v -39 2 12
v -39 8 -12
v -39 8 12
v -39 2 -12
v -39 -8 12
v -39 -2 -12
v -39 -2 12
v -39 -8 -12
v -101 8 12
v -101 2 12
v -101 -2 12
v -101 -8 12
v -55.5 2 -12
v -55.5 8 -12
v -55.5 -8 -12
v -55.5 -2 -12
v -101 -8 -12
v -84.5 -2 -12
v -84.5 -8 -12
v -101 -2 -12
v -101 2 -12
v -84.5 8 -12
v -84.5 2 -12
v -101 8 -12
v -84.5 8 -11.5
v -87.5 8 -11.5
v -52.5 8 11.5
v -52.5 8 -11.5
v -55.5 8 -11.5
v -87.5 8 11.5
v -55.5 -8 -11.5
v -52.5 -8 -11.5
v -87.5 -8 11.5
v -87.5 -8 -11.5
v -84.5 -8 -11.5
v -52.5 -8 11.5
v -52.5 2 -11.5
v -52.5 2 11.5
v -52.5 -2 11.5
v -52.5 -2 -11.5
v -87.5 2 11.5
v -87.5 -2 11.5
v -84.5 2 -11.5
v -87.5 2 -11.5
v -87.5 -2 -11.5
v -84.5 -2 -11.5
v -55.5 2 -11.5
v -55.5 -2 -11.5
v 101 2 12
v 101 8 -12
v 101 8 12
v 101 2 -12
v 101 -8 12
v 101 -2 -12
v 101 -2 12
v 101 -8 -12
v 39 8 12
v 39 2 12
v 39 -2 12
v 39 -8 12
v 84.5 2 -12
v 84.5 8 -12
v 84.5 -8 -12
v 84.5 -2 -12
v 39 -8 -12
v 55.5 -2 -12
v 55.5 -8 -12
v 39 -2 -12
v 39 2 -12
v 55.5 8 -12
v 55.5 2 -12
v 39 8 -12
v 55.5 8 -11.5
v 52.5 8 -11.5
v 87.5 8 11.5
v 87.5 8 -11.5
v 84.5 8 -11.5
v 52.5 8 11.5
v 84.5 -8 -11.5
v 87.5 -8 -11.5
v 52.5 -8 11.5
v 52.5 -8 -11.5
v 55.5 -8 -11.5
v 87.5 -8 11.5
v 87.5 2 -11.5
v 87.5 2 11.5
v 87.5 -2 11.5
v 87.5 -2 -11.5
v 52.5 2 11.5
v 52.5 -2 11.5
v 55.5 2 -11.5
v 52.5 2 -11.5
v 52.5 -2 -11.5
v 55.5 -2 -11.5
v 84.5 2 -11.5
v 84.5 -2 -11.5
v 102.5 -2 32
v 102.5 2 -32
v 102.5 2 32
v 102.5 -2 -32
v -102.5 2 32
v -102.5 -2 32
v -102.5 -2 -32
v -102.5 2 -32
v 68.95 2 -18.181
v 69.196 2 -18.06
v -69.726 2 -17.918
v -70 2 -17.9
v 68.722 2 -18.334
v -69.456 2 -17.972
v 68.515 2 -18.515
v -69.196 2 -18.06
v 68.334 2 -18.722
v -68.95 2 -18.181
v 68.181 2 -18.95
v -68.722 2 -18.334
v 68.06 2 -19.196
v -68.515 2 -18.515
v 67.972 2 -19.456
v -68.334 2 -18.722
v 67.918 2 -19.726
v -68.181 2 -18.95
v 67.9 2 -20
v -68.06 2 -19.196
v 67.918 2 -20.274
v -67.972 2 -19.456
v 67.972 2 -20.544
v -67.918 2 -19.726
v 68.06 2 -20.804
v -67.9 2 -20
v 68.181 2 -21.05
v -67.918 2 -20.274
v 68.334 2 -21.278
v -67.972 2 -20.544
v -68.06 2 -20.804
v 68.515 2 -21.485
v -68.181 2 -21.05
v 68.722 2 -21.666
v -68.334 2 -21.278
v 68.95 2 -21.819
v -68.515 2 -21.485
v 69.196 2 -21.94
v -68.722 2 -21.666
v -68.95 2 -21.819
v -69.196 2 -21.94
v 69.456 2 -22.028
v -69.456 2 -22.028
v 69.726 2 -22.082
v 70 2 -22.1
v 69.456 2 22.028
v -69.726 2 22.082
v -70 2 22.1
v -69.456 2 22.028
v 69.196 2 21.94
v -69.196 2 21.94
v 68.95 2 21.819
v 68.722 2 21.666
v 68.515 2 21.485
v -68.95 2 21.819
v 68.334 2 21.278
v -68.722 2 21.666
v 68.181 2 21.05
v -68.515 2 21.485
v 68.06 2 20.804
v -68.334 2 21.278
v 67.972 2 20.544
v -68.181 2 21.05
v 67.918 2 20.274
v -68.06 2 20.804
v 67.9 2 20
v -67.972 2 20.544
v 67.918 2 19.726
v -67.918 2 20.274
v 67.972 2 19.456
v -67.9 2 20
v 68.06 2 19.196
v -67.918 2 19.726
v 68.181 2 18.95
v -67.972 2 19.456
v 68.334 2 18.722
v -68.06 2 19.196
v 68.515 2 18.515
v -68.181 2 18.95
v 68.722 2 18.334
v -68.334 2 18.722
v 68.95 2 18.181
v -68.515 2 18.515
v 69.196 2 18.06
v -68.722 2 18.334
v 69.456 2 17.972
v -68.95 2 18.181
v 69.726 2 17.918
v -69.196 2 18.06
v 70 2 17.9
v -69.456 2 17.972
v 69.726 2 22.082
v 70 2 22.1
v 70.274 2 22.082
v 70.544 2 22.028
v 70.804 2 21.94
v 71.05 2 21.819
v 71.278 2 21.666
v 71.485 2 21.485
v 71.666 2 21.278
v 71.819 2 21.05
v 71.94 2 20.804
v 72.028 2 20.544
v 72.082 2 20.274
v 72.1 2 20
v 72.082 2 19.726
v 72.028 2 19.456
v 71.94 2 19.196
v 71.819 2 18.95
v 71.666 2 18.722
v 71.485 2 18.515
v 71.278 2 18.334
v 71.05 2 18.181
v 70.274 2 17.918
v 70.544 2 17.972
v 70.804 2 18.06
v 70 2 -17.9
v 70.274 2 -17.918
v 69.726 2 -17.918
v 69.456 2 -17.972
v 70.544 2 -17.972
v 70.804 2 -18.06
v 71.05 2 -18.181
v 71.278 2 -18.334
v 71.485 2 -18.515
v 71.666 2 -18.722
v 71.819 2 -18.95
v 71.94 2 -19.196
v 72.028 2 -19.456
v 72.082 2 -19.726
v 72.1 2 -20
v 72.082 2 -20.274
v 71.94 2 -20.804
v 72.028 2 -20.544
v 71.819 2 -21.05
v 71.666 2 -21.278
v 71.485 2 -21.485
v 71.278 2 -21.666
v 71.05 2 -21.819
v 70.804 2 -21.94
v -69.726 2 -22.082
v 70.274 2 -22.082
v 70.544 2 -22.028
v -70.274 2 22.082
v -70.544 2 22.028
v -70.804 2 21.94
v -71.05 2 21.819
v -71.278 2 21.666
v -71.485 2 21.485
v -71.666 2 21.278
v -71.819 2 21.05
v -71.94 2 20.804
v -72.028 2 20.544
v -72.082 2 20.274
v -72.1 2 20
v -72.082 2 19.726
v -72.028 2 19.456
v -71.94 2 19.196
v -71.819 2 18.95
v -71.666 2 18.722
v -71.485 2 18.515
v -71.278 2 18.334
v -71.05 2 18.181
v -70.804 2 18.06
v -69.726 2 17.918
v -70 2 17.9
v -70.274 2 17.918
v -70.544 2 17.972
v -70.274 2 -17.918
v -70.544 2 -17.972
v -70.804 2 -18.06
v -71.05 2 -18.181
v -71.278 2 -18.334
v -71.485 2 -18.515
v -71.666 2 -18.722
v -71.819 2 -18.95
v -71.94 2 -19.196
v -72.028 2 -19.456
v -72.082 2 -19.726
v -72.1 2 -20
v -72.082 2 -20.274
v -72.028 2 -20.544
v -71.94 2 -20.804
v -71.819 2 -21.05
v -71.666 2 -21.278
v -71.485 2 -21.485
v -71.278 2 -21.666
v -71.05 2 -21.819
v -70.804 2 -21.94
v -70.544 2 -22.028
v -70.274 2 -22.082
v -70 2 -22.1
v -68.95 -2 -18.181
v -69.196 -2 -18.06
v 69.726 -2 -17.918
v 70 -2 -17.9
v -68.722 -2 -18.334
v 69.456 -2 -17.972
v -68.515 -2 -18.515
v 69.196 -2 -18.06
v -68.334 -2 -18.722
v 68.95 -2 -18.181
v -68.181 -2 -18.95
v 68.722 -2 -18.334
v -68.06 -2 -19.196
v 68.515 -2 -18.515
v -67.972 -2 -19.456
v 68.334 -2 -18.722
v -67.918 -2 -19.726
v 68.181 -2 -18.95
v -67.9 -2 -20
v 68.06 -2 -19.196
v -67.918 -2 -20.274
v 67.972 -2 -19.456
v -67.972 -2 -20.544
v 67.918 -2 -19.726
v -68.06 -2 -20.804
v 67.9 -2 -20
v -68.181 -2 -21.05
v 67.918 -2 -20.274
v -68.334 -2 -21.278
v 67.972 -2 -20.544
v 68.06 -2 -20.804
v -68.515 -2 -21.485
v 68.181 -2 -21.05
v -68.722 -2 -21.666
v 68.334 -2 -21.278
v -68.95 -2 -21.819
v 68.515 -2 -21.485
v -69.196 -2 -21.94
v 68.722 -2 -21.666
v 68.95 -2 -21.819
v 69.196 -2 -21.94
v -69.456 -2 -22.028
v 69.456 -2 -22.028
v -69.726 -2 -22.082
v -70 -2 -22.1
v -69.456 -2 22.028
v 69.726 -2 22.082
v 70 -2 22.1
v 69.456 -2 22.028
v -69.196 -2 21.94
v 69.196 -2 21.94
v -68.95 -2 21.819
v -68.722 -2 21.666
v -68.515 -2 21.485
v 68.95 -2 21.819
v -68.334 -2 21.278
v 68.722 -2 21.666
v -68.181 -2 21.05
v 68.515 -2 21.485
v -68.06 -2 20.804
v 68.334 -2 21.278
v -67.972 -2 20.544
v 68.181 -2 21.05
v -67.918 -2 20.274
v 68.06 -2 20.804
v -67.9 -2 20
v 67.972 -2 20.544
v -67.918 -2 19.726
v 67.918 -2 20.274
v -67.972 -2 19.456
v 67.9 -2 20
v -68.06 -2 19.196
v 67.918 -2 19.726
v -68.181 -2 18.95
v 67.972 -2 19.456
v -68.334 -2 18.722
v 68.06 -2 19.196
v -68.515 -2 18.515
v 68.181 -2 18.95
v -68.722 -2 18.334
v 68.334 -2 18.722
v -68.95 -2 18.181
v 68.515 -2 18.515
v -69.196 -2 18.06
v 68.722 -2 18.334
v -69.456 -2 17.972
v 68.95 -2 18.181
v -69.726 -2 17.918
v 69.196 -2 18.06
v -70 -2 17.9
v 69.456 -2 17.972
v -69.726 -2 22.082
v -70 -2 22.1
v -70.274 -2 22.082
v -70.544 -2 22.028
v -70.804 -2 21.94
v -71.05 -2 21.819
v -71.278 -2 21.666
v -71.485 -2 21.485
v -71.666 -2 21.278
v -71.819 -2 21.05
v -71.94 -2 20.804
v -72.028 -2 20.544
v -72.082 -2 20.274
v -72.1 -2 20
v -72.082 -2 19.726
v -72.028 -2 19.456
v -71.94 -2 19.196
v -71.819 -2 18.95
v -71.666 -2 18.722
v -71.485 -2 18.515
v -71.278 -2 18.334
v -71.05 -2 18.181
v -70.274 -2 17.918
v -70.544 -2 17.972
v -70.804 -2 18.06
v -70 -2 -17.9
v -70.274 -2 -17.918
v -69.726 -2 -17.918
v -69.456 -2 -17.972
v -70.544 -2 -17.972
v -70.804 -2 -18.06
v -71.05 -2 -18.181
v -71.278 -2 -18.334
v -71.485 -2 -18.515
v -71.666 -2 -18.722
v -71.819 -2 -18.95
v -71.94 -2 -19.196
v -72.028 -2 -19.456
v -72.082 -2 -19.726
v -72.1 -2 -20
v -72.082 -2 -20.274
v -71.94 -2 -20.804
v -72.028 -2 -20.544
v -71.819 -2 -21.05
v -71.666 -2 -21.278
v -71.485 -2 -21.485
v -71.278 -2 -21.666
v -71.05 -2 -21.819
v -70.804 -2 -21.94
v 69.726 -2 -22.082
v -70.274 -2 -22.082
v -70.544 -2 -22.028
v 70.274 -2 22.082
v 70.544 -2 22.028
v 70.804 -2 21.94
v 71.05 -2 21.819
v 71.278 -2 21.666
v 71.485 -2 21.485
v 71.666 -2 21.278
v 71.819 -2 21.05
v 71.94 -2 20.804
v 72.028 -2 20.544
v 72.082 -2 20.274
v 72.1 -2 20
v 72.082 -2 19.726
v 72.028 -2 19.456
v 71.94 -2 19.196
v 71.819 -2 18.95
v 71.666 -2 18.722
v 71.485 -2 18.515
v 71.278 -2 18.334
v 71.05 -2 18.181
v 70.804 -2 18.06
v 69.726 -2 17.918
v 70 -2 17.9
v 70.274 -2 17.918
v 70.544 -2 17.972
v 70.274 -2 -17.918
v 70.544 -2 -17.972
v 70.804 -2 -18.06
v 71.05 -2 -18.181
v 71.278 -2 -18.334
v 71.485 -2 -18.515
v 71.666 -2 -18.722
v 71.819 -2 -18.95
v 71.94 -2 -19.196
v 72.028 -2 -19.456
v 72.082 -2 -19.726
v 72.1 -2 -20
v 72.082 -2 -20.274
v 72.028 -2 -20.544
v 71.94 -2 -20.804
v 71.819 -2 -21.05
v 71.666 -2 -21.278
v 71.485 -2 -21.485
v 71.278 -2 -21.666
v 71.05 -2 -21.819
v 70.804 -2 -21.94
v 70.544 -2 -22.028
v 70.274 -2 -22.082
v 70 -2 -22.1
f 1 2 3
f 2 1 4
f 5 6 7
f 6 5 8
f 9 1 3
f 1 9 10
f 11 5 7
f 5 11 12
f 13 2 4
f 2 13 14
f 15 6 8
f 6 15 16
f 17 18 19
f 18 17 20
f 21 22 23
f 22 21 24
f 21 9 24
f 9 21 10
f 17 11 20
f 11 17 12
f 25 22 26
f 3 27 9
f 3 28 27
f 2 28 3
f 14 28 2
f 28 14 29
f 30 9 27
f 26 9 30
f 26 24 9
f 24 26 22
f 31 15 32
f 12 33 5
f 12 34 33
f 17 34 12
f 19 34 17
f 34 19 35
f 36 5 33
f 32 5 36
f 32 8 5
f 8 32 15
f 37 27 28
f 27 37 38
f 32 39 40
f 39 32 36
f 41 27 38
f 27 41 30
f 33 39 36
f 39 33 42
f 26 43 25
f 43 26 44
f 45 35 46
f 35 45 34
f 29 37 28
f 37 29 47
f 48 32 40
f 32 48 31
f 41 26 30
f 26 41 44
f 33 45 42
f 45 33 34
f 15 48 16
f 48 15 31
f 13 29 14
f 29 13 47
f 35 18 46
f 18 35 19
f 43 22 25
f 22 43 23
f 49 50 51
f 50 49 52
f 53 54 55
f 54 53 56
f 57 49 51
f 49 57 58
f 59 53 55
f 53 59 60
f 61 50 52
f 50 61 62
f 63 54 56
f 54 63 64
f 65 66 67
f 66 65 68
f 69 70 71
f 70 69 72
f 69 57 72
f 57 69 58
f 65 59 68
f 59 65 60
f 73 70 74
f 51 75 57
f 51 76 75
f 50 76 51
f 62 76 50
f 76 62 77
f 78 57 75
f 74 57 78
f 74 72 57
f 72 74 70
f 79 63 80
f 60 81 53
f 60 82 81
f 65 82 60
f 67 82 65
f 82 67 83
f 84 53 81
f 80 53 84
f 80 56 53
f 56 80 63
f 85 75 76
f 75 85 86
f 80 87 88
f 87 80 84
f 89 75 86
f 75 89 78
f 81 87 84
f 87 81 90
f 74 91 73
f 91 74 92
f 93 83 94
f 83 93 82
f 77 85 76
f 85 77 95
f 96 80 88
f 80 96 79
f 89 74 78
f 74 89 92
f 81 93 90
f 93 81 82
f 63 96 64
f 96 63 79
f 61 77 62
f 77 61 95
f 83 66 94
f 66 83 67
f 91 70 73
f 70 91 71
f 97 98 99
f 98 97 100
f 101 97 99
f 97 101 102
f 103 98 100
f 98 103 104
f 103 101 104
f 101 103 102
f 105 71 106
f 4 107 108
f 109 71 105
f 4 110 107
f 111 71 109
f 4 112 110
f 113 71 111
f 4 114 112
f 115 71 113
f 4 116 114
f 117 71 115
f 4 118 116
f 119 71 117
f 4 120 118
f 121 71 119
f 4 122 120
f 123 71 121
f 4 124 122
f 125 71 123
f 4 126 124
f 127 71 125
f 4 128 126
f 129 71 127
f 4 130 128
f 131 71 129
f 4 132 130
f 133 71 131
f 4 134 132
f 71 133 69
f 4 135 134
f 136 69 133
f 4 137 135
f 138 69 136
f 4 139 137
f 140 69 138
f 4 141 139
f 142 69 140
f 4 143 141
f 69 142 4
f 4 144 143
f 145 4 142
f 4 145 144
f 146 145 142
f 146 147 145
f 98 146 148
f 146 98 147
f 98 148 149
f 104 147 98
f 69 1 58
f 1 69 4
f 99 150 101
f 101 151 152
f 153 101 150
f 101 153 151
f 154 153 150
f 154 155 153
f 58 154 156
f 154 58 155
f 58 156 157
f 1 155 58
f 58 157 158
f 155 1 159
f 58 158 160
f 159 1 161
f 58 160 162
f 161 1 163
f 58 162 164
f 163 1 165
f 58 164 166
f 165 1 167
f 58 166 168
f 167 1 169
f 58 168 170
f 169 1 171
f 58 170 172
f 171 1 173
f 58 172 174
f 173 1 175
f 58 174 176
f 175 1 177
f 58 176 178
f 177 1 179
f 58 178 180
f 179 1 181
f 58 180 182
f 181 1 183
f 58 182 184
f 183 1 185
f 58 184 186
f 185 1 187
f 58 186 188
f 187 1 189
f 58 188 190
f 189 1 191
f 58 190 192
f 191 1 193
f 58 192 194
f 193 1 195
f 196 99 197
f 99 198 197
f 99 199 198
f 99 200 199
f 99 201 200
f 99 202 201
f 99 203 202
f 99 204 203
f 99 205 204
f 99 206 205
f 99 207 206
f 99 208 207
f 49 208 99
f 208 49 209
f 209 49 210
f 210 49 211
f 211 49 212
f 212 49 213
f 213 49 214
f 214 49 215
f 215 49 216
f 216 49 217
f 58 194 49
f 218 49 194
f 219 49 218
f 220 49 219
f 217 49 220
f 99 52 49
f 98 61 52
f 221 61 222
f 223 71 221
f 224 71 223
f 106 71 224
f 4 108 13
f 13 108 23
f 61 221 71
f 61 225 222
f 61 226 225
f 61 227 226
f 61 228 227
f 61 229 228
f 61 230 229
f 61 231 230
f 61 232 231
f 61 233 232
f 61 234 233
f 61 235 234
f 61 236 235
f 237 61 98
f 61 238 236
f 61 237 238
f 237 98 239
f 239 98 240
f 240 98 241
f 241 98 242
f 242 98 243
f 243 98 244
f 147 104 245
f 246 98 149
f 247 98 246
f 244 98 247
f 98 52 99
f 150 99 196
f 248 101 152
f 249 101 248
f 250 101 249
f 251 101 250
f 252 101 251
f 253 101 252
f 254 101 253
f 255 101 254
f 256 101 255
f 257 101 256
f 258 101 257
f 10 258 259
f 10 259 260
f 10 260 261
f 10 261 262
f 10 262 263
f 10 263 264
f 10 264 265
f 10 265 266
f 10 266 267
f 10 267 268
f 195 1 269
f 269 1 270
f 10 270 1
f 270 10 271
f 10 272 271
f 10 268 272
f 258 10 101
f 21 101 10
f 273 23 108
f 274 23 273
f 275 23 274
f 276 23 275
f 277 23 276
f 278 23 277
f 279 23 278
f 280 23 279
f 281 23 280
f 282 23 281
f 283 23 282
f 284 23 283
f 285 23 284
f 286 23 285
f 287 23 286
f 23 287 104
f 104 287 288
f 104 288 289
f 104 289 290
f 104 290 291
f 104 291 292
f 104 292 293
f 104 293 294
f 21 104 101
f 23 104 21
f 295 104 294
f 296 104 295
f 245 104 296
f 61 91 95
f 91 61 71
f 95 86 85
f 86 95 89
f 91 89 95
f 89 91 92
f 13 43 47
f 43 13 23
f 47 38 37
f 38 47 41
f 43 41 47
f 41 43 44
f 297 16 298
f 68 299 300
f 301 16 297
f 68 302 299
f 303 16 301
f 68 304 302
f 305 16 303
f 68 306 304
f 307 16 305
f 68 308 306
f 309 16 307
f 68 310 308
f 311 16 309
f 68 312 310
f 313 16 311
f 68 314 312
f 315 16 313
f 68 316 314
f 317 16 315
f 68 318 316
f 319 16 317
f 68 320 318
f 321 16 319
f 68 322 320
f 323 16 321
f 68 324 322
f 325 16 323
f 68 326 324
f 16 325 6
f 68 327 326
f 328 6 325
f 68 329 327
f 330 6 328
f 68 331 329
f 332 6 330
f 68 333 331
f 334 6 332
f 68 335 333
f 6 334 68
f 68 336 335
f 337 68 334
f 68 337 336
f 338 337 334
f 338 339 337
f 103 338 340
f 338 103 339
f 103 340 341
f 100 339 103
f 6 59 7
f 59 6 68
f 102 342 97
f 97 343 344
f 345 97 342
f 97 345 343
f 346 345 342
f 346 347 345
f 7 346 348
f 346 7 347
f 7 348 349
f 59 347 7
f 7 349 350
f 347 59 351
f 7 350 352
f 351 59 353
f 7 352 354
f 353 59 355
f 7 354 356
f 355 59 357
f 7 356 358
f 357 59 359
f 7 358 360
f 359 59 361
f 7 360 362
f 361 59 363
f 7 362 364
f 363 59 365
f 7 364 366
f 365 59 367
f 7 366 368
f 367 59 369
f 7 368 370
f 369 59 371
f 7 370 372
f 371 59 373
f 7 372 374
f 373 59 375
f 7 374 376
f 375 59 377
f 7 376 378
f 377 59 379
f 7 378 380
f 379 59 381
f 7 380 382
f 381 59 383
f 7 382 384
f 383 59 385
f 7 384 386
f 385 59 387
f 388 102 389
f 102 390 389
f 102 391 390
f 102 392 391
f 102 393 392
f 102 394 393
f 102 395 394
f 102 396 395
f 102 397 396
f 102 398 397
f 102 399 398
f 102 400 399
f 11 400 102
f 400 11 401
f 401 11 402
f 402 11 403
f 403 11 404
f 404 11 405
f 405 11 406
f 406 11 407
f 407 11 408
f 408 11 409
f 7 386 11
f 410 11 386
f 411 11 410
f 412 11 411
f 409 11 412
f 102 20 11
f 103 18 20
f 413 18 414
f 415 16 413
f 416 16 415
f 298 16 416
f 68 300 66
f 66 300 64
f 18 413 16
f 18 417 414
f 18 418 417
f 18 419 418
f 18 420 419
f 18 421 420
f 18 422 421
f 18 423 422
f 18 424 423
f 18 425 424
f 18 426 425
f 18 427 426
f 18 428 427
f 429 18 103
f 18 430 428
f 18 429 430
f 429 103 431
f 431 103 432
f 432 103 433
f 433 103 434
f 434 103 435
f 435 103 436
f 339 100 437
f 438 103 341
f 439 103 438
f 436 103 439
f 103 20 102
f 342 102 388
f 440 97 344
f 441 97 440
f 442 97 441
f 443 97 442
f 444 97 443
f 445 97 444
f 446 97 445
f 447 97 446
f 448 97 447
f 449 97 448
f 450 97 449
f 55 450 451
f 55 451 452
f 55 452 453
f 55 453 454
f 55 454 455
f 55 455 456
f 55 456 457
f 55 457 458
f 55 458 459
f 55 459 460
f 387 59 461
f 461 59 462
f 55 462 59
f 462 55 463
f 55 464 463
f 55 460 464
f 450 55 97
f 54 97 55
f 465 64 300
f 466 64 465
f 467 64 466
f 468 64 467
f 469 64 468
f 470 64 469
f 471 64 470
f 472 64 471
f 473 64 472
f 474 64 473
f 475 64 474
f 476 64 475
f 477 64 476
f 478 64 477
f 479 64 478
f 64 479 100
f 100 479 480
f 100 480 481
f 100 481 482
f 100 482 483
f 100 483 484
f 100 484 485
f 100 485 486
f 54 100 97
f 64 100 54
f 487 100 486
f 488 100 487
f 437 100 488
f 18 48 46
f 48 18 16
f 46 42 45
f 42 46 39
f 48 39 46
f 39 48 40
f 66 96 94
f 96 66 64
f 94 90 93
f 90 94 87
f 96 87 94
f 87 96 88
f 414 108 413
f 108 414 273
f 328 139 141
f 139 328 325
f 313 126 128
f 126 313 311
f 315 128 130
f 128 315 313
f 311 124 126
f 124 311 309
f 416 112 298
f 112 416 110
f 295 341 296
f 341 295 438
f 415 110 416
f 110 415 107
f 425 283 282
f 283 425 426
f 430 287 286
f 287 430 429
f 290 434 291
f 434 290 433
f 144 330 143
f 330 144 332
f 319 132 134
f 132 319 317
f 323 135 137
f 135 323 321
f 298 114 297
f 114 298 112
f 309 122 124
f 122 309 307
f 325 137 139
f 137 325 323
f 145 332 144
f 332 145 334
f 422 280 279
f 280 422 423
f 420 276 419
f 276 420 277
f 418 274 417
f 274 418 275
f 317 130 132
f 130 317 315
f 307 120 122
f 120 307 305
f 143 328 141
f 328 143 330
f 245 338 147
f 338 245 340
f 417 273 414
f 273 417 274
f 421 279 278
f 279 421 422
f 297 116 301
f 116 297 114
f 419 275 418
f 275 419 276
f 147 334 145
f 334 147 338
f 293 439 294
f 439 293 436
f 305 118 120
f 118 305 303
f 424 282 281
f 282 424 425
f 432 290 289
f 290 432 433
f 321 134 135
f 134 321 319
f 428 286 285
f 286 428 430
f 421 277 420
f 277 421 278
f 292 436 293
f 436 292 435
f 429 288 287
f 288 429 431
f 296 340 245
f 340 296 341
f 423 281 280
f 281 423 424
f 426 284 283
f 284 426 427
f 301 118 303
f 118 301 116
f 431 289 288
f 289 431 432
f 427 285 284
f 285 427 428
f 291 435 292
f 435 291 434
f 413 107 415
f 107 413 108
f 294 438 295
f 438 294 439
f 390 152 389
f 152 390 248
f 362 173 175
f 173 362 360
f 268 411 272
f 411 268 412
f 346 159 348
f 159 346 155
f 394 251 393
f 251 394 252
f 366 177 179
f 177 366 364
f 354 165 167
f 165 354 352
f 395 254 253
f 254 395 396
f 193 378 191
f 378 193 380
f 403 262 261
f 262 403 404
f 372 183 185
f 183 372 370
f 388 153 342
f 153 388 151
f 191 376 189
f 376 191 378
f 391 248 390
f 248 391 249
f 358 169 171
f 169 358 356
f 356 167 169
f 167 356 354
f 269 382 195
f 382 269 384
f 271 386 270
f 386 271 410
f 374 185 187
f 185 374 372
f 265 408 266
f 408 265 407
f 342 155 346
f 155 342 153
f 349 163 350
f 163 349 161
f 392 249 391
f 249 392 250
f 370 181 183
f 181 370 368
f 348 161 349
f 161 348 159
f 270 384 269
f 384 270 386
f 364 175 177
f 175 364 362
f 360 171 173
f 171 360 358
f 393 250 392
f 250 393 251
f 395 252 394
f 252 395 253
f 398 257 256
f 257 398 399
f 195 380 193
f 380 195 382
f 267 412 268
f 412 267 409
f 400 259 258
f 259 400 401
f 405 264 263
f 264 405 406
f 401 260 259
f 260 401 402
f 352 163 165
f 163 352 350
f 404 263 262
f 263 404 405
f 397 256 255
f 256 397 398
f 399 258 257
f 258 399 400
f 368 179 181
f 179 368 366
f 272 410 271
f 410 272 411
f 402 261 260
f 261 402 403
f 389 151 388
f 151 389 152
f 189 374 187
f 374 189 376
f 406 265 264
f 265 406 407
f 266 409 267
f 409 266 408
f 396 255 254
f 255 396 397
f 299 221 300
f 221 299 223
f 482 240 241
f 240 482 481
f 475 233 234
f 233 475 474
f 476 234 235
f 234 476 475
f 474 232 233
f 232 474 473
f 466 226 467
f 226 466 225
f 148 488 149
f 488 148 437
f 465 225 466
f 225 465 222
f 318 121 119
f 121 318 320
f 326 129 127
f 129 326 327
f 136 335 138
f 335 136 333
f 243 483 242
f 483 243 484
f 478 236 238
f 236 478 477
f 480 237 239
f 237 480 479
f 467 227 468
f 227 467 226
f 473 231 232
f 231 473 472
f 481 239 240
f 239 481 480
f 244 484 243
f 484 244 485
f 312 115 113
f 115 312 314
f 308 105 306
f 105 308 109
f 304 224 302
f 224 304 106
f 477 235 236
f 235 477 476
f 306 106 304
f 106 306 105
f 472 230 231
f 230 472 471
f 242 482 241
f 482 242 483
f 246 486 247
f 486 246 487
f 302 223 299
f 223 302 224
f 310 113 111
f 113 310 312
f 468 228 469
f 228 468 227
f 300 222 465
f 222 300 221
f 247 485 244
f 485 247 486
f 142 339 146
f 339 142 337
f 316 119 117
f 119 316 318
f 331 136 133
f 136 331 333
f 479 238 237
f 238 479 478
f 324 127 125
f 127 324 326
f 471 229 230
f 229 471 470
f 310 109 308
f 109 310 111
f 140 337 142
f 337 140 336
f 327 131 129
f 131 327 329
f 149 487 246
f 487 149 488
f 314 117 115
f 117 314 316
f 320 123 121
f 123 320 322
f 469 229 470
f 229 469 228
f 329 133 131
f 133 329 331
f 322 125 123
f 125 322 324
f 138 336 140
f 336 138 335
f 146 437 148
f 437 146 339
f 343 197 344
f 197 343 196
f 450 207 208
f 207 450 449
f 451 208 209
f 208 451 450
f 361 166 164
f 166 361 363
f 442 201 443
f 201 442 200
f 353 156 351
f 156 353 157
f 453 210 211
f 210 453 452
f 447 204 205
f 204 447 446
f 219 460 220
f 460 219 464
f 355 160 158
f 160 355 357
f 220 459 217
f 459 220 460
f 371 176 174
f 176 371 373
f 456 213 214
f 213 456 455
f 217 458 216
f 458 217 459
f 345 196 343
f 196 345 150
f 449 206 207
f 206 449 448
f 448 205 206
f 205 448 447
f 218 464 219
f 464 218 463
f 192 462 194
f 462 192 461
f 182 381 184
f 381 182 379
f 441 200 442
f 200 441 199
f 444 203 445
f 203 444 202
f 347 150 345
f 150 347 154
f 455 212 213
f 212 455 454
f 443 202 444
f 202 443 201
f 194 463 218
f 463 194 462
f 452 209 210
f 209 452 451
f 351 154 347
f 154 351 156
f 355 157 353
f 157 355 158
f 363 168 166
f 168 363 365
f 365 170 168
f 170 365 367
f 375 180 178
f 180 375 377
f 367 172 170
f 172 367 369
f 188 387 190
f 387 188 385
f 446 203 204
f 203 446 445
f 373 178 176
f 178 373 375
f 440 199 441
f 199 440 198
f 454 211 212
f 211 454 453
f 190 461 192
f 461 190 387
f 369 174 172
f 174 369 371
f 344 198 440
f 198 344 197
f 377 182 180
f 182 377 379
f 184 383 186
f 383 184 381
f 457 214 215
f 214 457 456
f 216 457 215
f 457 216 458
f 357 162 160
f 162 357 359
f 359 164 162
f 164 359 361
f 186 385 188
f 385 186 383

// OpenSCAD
// file: ../geometry.scad
// Shared geometric helpers for the AetherGuard enclosure.

module rounded_rect_2d(size, radius) {
    safe_radius = min(radius, min(size[0], size[1]) / 2 - 0.01);

    offset(r = safe_radius)
        translate([safe_radius, safe_radius])
            square([size[0] - 2 * safe_radius, size[1] - 2 * safe_radius]);
}

module rounded_prism(size, radius) {
    linear_extrude(height = size[2])
        rounded_rect_2d([size[0], size[1]], radius);
}

module rounded_front_plate(width, height, depth, radius) {
    translate([0, depth, 0])
        rotate([90, 0, 0])
            linear_extrude(height = depth)
                rounded_rect_2d([width, height], radius);
}

module rounded_slot_2d(length, width) {
    hull() {
        translate([width / 2, width / 2])
            circle(d = width);
        translate([length - width / 2, width / 2])
            circle(d = width);
    }
}

module rounded_slot_prism(length, width, height) {
    linear_extrude(height = height)
        rounded_slot_2d(length, width);
}

module hex_ring(outer_diameter, band_width, height) {
    difference() {
        cylinder(h = height, d = outer_diameter, $fn = 6);
        translate([0, 0, -0.1])
            cylinder(h = height + 0.2, d = outer_diameter - 2 * band_width, $fn = 6);
    }
}

module countersunk_hole(through_diameter, head_diameter, total_height, countersink_height) {
    translate([0, 0, -0.1])
        cylinder(h = total_height + 0.2, d = through_diameter);
    translate([0, 0, total_height - countersink_height])
        cylinder(
            h = countersink_height + 0.1,
            d1 = through_diameter,
            d2 = head_diameter
        );
}
// file: ../top-cover.scad
// AetherGuard Root-Resistant Gateway enclosure - armored top cover.
//
// The low-profile lid combines passive airflow, a stiff center spine, a
// standardized 22 mm stack-light pattern, and paint-fill branding grooves.
//
// Render/export:
//   openscad -o top-cover.stl top-cover.scad

include <parameters.scad>
use <geometry.scad>

$fn = 64;

module top_cover() {
    stack_light_local_x = STACK_LIGHT_X - WALL;
    stack_light_local_y = STACK_LIGHT_Y - WALL;

    difference() {
        union() {
            rounded_prism(
                [PANEL_W, COVER_D, ROOF_T],
                max(CORNER_R - WALL, 1)
            );

            // Shallow armor skin and center spine add stiffness without making
            // the full lid thick or heavy.
            translate([16, 16, ROOF_T - EPS])
                rounded_prism([PANEL_W - 32, COVER_D - 32, 1.8], 6);
            translate([PANEL_W / 2 - 14, 29, ROOF_T + 1.5])
                rounded_prism([28, COVER_D - 58, 1.4], 4);

            stack_light_collar(stack_light_local_x, stack_light_local_y);
        }

        cover_fastener_holes();
        stack_light_mount_holes(stack_light_local_x, stack_light_local_y);
        logic_vent_banks();
        interlock_exhaust_bank();
        top_style_grooves();
        tamper_seal_holes();
        top_branding_engraving();
    }

    underside_registration_skirt();
    underside_stiffening_ribs();
}

module cover_fastener_holes() {
    for (screw_position = TOP_COVER_SCREW_POSITIONS) {
        translate([screw_position[0], screw_position[1], 0])
            countersunk_hole(
                TOP_COVER_SCREW_D,
                TOP_COVER_SCREW_HEAD_D,
                ROOF_T + 3.2,
                1.8
            );
    }
}

module stack_light_collar(center_x, center_y) {
    translate([center_x, center_y, ROOF_T + 1.4])
        difference() {
            cylinder(h = 2.4, d = STACK_LIGHT_COLLAR_OD);
            translate([0, 0, -0.1])
                cylinder(h = 2.6, d = STACK_LIGHT_SHAFT_D + 5);
        }
}

module stack_light_mount_holes(center_x, center_y) {
    translate([center_x, center_y, -1])
        cylinder(h = ROOF_T + 6, d = STACK_LIGHT_SHAFT_D);

    for (mount_angle = [0, 120, 240]) {
        translate([
            center_x + cos(mount_angle) * STACK_LIGHT_BOLT_CIRCLE_D / 2,
            center_y + sin(mount_angle) * STACK_LIGHT_BOLT_CIRCLE_D / 2,
            -1
        ])
            cylinder(h = ROOF_T + 6, d = STACK_LIGHT_MOUNT_D);
    }
}

module logic_vent_banks() {
    vent_height = ROOF_T + 5;

    // Left bank follows the M1 heat-sink direction.
    for (vent_index = [0 : 8]) {
        translate([28 + vent_index * 12, 50, -1])
            rounded_slot_prism(TOP_VENT_SLOT_LEN, TOP_VENT_SLOT_W, vent_height);
    }

    // Right bank is shorter to preserve material around the M3 vault and the
    // stack-light wiring path.
    for (vent_index = [0 : 7]) {
        translate([177 + vent_index * 11, 52, -1])
            rounded_slot_prism(TOP_VENT_SLOT_LEN - 5, TOP_VENT_SLOT_W, vent_height);
    }
}

module interlock_exhaust_bank() {
    vent_height = ROOF_T + 5;

    for (vent_index = [0 : 8]) {
        translate([24 + vent_index * 27, COVER_D - 30, -1])
            rounded_slot_prism(18, 4, vent_height);
    }
}

module top_style_grooves() {
    // Shallow diagonal grooves can be paint-filled in AetherGuard cyan.
    for (groove_offset = [0, 10, 20]) {
        translate([34 + groove_offset, 25, ROOF_T + 0.9])
            rotate([0, 0, -18])
                cube([38, 1.6, 4]);
        translate([PANEL_W - 72 + groove_offset, 25, ROOF_T + 0.9])
            rotate([0, 0, -18])
                cube([38, 1.6, 4]);
    }
}

module tamper_seal_holes() {
    for (tamper_x = [PANEL_W - 60, PANEL_W - 48]) {
        translate([tamper_x, 24, -1])
            cylinder(h = ROOF_T + 6, d = 2.5);
    }
}

module underside_registration_skirt() {
    skirt_height = 2.4;
    skirt_thickness = 2;

    translate([7, 12, -skirt_height])
        cube([skirt_thickness, COVER_D - 24, skirt_height + EPS]);
    translate([PANEL_W - 9, 12, -skirt_height])
        cube([skirt_thickness, COVER_D - 24, skirt_height + EPS]);
    translate([12, 7, -skirt_height])
        cube([PANEL_W - 24, skirt_thickness, skirt_height + EPS]);
    translate([12, COVER_D - 9, -skirt_height])
        cube([PANEL_W - 24, skirt_thickness, skirt_height + EPS]);
}

module underside_stiffening_ribs() {
    translate([22, 37, -3])
        cube([PANEL_W - 44, 3, 3 + EPS]);
    translate([22, COVER_D - 40, -3])
        cube([PANEL_W - 44, 3, 3 + EPS]);
    translate([PANEL_W / 2 - 1.5, 34, -3])
        cube([3, COVER_D - 68, 3 + EPS]);
}

module top_branding_engraving() {
    spine_engraving_z = ROOF_T + 2.35;
    skin_engraving_z = ROOF_T + 1.15;

    translate([PANEL_W / 2, 99, spine_engraving_z])
        hex_ring(22, 2.4, 1.1);
    translate([PANEL_W / 2, 99, spine_engraving_z])
        linear_extrude(height = 1.1)
            text("AG", size = 7.5, halign = "center", valign = "center");

    translate([PANEL_W / 2, 69, spine_engraving_z])
        rotate([0, 0, 90])
            linear_extrude(height = 1.1)
                text(
                    "AETHERGUARD",
                    size = 7.4,
                    halign = "center",
                    valign = "center",
                    spacing = 1.05
                );

    translate([
        STACK_LIGHT_X - WALL,
        STACK_LIGHT_Y - WALL - 32,
        skin_engraving_z
    ])
        linear_extrude(height = 1.1)
            text("STATE BEACON", size = 4, halign = "center", valign = "center");

    translate([PANEL_W - 54, 36, skin_engraving_z])
        linear_extrude(height = 1.1)
            text("TAMPER", size = 3.6, halign = "center", valign = "center");
}

top_cover();
// file: ../front-panel.scad
// AetherGuard Root-Resistant Gateway enclosure - operator front panel.
//
// The face is deliberately divided into data, management/service, and hardware
// authorization zones so a field operator can understand the trust boundary at
// a glance and by touch.
//
// Render/export:
//   openscad -o front-panel.stl front-panel.scad

include <parameters.scad>
use <geometry.scad>

$fn = 64;

module front_panel() {
    difference() {
        rounded_front_plate(PANEL_W, PANEL_H, PANEL_T, 4.5);

        panel_rect_cutout(SERVER_PORT_X, RJ45_Z, RJ45_W, RJ45_H);
        panel_rect_cutout(LANWAN_PORT_X, RJ45_Z, RJ45_W, RJ45_H);
        panel_rect_cutout(MGMT_PORT_X, RJ45_Z, RJ45_W, RJ45_H);
        panel_rect_cutout(SERVICE_USB_X, SERVICE_USB_Z, USB_C_W, USB_C_H);

        panel_round_cutout(ESTOP_X, ESTOP_Z, BUTTON_DIAMETER);
        panel_round_cutout(CONFIRM_X, CONFIRM_Z, BUTTON_DIAMETER);
        panel_rect_cutout(
            STATUS_WINDOW_X,
            STATUS_WINDOW_Z,
            STATUS_WINDOW_W,
            STATUS_WINDOW_H
        );

        for (screw_position = FRONT_PANEL_SCREW_POSITIONS) {
            panel_round_cutout(
                screw_position[0],
                screw_position[1],
                FRONT_PANEL_SCREW_D
            );
        }

        front_style_recesses();
        front_engraving();
    }

    data_plane_bezel();
    rect_frame(SERVER_PORT_X, RJ45_Z, RJ45_W, RJ45_H, 2, 1.4);
    rect_frame(LANWAN_PORT_X, RJ45_Z, RJ45_W, RJ45_H, 2, 1.4);
    rect_frame(MGMT_PORT_X, RJ45_Z, RJ45_W, RJ45_H, 2.4, 1.7);
    rect_frame(SERVICE_USB_X, SERVICE_USB_Z, USB_C_W, USB_C_H, 1.6, 1.2);
    rect_frame(
        STATUS_WINDOW_X,
        STATUS_WINDOW_Z,
        STATUS_WINDOW_W,
        STATUS_WINDOW_H,
        2,
        1.5
    );
    status_window_dividers();

    button_guard(
        ESTOP_X,
        ESTOP_Z,
        BUTTON_DIAMETER + 2,
        ESTOP_GUARD_OD,
        3
    );
    button_guard(
        CONFIRM_X,
        CONFIRM_Z,
        BUTTON_DIAMETER + 2,
        CONFIRM_GUARD_OD,
        2.2
    );
    control_zone_separator();
}

module panel_rect_cutout(center_x, center_z, width, height) {
    translate([center_x - width / 2, -1, center_z - height / 2])
        cube([width, PANEL_T + 2, height]);
}

module panel_round_cutout(center_x, center_z, diameter) {
    translate([center_x, PANEL_T + 1, center_z])
        rotate([90, 0, 0])
            cylinder(h = PANEL_T + 2, d = diameter);
}

module front_style_recesses() {
    // Paint-fill channels create the visual line that separates data-plane I/O
    // from the physical authorization controls.
    translate([18, -0.4, 48])
        cube([164, 1.2, 1.2]);
    translate([202, -0.4, 47])
        rotate([0, 0, -12])
            cube([105, 1.2, 1.2]);

    for (groove_offset = [0, 7, 14]) {
        translate([151 + groove_offset, -0.4, 58])
            rotate([0, 0, -20])
                cube([23, 1.2, 1.2]);
    }
}

module data_plane_bezel() {
    bezel_x = 16;
    bezel_z = 18;
    bezel_w = 170;
    bezel_h = 29;
    bezel_t = 1.2;
    bezel_depth = 0.9;

    translate([bezel_x, -bezel_depth, bezel_z])
        cube([bezel_w, bezel_depth + EPS, bezel_t]);
    translate([bezel_x, -bezel_depth, bezel_z + bezel_h - bezel_t])
        cube([bezel_w, bezel_depth + EPS, bezel_t]);
    translate([bezel_x, -bezel_depth, bezel_z])
        cube([bezel_t, bezel_depth + EPS, bezel_h]);
    translate([bezel_x + bezel_w - bezel_t, -bezel_depth, bezel_z])
        cube([bezel_t, bezel_depth + EPS, bezel_h]);
}

module rect_frame(center_x, center_z, width, height, thickness, depth) {
    translate([
        center_x - width / 2 - thickness,
        -depth,
        center_z - height / 2 - thickness
    ])
        cube([width + 2 * thickness, depth + EPS, thickness]);
    translate([
        center_x - width / 2 - thickness,
        -depth,
        center_z + height / 2
    ])
        cube([width + 2 * thickness, depth + EPS, thickness]);
    translate([
        center_x - width / 2 - thickness,
        -depth,
        center_z - height / 2
    ])
        cube([thickness, depth + EPS, height]);
    translate([
        center_x + width / 2,
        -depth,
        center_z - height / 2
    ])
        cube([thickness, depth + EPS, height]);
}

module status_window_dividers() {
    segment_width = STATUS_WINDOW_W / STATUS_SEGMENT_COUNT;
    window_left = STATUS_WINDOW_X - STATUS_WINDOW_W / 2;

    for (divider_index = [1 : STATUS_SEGMENT_COUNT - 1]) {
        translate([
            window_left + divider_index * segment_width - 0.65,
            -1.7,
            STATUS_WINDOW_Z - STATUS_WINDOW_H / 2
        ])
            cube([1.3, 1.9, STATUS_WINDOW_H]);
    }
}

module button_guard(center_x, center_z, inner_diameter, outer_diameter, depth) {
    translate([center_x, EPS, center_z])
        rotate([90, 0, 0])
            difference() {
                cylinder(h = depth + EPS, d = outer_diameter);
                translate([0, 0, -0.1])
                    cylinder(h = depth + 0.4, d = inner_diameter);
            }
}

module control_zone_separator() {
    translate([195, -1.4, 11])
        cube([2.4, 1.6, 35]);
    translate([195, -1.4, 43])
        rotate([0, -35, 0])
            cube([10, 1.6, 2.4]);
}

module front_engraving() {
    translate([29, 0.6, 64])
        rotate([90, 0, 0])
            hex_ring(21, 2.4, 0.8);
    engraved_panel_text("AG", 29, 64, 6.5, 0.75);
    engraved_panel_text("AETHERGUARD", 93, 66, 9.2, 0.75);
    engraved_panel_text("ROOT-RESISTANT GATEWAY", 97, 55.5, 4.1, 0.6);

    engraved_panel_text("DATA PLANE", 76, 43, 4.2, 0.6);
    engraved_panel_text("TRUST", MGMT_PORT_X, 43, 4.2, 0.6);
    engraved_panel_text("SERVICE", SERVICE_USB_X, 43, 4.2, 0.6);

    engraved_panel_text("SERVER", SERVER_PORT_X, 13.5, 4.1, 0.6);
    engraved_panel_text("LAN/WAN", LANWAN_PORT_X, 13.5, 4.1, 0.6);
    engraved_panel_text("MGMT", MGMT_PORT_X, 13.5, 4.1, 0.6);
    engraved_panel_text("USB-C", SERVICE_USB_X, 13.5, 4.1, 0.6);

    segment_labels = ["ISOLATED", "ARMED", "RELEASED", "FAULT"];
    segment_width = STATUS_WINDOW_W / STATUS_SEGMENT_COUNT;
    window_left = STATUS_WINDOW_X - STATUS_WINDOW_W / 2;

    for (segment_index = [0 : STATUS_SEGMENT_COUNT - 1]) {
        engraved_panel_text(
            segment_labels[segment_index],
            window_left + segment_width * (segment_index + 0.5),
            STATUS_WINDOW_Z + 11.5,
            3,
            0.5
        );
    }

    engraved_panel_text("E-STOP", ESTOP_X, 49.2, 3.7, 0.6);
    engraved_panel_text("CONFIRM", CONFIRM_X, 49.2, 3.7, 0.6);
}

module engraved_panel_text(label, center_x, center_z, size_value, engraving_depth = 0.55) {
    translate([center_x, engraving_depth, center_z])
        rotate([90, 0, 0])
            linear_extrude(height = engraving_depth + EPS)
                text(
                    label,
                    size = size_value,
                    halign = "center",
                    valign = "center"
                );
}

front_panel();
// file: ../parameters.scad
// AetherGuard Root-Resistant Gateway enclosure shared parameters.
// Units: millimeters. OpenSCAD 2021.01+.

// Low-profile structural chassis envelope. The 210 mm depth preserves
// compatibility with common 220 x 220 mm printers after the width is split.
// The raised lid armor reaches approximately 92 mm before the stack light.
ENCLOSURE_W = 320;
ENCLOSURE_D = 210;
ENCLOSURE_H = 88;
CORNER_R = 9;

// FDM prototype shell model.
WALL = 3.2;
FLOOR_T = 3.4;
ROOF_T = 3.2;
PANEL_T = 3.2;
EPS = 0.2;

PANEL_W = ENCLOSURE_W - 2 * WALL;
PANEL_H = ENCLOSURE_H - FLOOR_T - ROOF_T;
COVER_D = ENCLOSURE_D - 2 * WALL;

// Front-panel fasteners. Coordinates are relative to the removable panel.
FRONT_PANEL_SCREW_D = 3.4;
FRONT_PANEL_SCREW_POSITIONS = [
    [10, 10],
    [10, PANEL_H - 10],
    [PANEL_W / 2 - 12, PANEL_H - 9],
    [PANEL_W / 2 + 12, PANEL_H - 9],
    [PANEL_W - 10, 10],
    [PANEL_W - 10, PANEL_H - 10]
];

// Network and service cutouts. The fit allowance is intended for panel-mount
// couplers rather than direct alignment to a specific gateway motherboard.
RJ45_W = 18.2;
RJ45_H = 15.4;
RJ45_Z = 29;
SERVER_PORT_X = 32;
LANWAN_PORT_X = 76;
MGMT_PORT_X = 128;

USB_C_W = 12;
USB_C_H = 7;
SERVICE_USB_X = 168;
SERVICE_USB_Z = 29;

// Operator controls. The E-stop guard is deliberately larger than the confirm
// guard so the controls remain distinguishable by touch.
BUTTON_DIAMETER = 22.5;
ESTOP_X = 236;
ESTOP_Z = 27;
CONFIRM_X = 286;
CONFIRM_Z = 27;
ESTOP_GUARD_OD = 40;
CONFIRM_GUARD_OD = 32;

// Four-segment state window: isolated, armed, released, and fault.
STATUS_WINDOW_W = 120;
STATUS_WINDOW_H = 13;
STATUS_WINDOW_X = 246;
STATUS_WINDOW_Z = 59;
STATUS_SEGMENT_COUNT = 4;
LED_D = 6;

// Rear service interface. The rectangular opening accepts a replaceable power
// inlet sub-panel; round entries are for isolated control and light harnesses.
POWER_MODULE_W = 76;
POWER_MODULE_H = 32;
POWER_MODULE_X = 49;
POWER_MODULE_Z = 27;
CABLE_GLAND_QTY = 4;
CABLE_GLAND_DIAMETER = 12.5;
CABLE_GLAND_START_X = 112;
CABLE_GLAND_SPACING = 33;
CABLE_GLAND_Z = 27;
GROUND_LUG_DIAMETER = 5.2;
GROUND_LUG_X = 272;
GROUND_LUG_Z = 27;

// Top cover and optional 22 mm stack-light mounting pattern.
TOP_COVER_SCREW_D = 4.3;
TOP_COVER_SCREW_HEAD_D = 8.5;
TOP_COVER_SCREW_POSITIONS = [
    [12, 12],
    [PANEL_W / 2 - 20, 12],
    [PANEL_W / 2 + 20, 12],
    [PANEL_W - 12, 12],
    [12, COVER_D - 12],
    [PANEL_W / 2 - 20, COVER_D - 12],
    [PANEL_W / 2 + 20, COVER_D - 12],
    [PANEL_W - 12, COVER_D - 12]
];
STACK_LIGHT_SHAFT_D = 22.5;
STACK_LIGHT_COLLAR_OD = 48;
STACK_LIGHT_BOLT_CIRCLE_D = 36;
STACK_LIGHT_MOUNT_D = 3.4;
STACK_LIGHT_X = 286;
STACK_LIGHT_Y = 172;

// Single-level logic bay. M1 and M2 sit side-by-side to shorten service paths
// and remove the inaccessible lower electronics deck from the previous model.
LOGIC_BAY_END_Y = 143;
POWER_PARTITION_Y = 145;
POWER_PARTITION_T = 3;
POWER_PARTITION_TOP_Z = 76;
PARTITION_GROMMET_D = 14;

// M1 gateway fit envelope (Protectli VP2430 class).
M1_W = 145;
M1_D = 128;
M1_H = 40;
M1_X = 10;
M1_Y = 11;
M1_RETAINER_H = 7;
M1_RETAINER_T = 4;

// M2 controller fit envelope (NUCLEO-H563ZI class).
NUCLEO_W = 122;
NUCLEO_D = 108;
NUCLEO_X = 168;
NUCLEO_Y = 35;
STANDOFF_HEIGHT = 7;
STANDOFF_OD = 8;
STANDOFF_HOLE_D = 3.2;

// M3 secure-element fit envelope and guarded carrier location.
SE_W = 24;
SE_D = 24;
SE_H = 8;
SE_X = 266;
SE_Y = 8;
SE_VAULT_WALL = 2.4;

// Rear M4 interlock bay. The rail is transverse so relay, optocoupler, and
// distribution modules remain reachable after the lid is removed.
INTERNAL_DIN_X = 16;
INTERNAL_DIN_Y = 160;
INTERNAL_DIN_Z = FLOOR_T;
INTERNAL_DIN_LEN = 288;
DIN_RAIL_WIDTH = 35;
DIN_RAIL_HEIGHT = 8;

PSU_W = 92;
RELAY_W = 70;
OPTO_W = 68;
DIN_MODULE_D = 56;
DIN_MODULE_H = 42;
DIN_MODULE_GAP = 8;
DIN_MODULE_START_X = 22;
DIN_MODULE_START_Y = 148;

// Dual rear DIN-rail clips distribute the enclosure load across the rail.
INTEGRATED_DIN_CLIPS = false;
DIN_RAIL_CLIP_WIDTH = 62;
DIN_RAIL_CLIP_DEPTH = 16;
DIN_RAIL_CLIP_HEIGHT = 24;
DIN_RAIL_CLIP_CENTERS_X = [90, 230];
DIN_RAIL_CLIP_MOUNT_Z = 48;

// Ventilation and chassis detailing.
SIDE_VENT_ROWS = 2;
SIDE_VENT_QTY = 6;
SIDE_VENT_SPACING = 18;
SIDE_VENT_SLOT_LEN = 13;
SIDE_VENT_SLOT_H = 3.4;
TOP_VENT_SLOT_W = 5;
TOP_VENT_SLOT_LEN = 58;
CHASSIS_ARMOR_RAIL_DEPTH = 1.6;

// Bottom mounting points accept M4 rubber feet or a separate wall bracket.
BOTTOM_MOUNT_D = 4.3;
BOTTOM_MOUNT_POSITIONS = [
    [22, 24],
    [ENCLOSURE_W - 22, 24],
    [22, ENCLOSURE_D - 24],
    [ENCLOSURE_W - 22, ENCLOSURE_D - 24]
];
// file: printable-common.scad
// Common helpers for the 220x220 mm FDM printable split version.
// Generated parts are arranged as individual printable pieces.

include <../parameters.scad>
use <../chassis.scad>
use <../front-panel.scad>
use <../top-cover.scad>

SPLIT_X = ENCLOSURE_W / 2;
CUT_OVERLAP = 0.35;
PRINT_CLEARANCE = 0.25;

module chassis_no_integrated_clip() {
    difference() {
        chassis();

        // Remove the integrated rear DIN clip so the chassis halves fit
        // common 220x220 print beds. Print the screw-on clip separately.
        translate([-20, ENCLOSURE_D - EPS, -20])
            cube([ENCLOSURE_W + 40, DIN_RAIL_CLIP_DEPTH + 60, ENCLOSURE_H + 40]);
    }
}

module rear_clip_mount_holes() {
    for (x = DIN_RAIL_CLIP_CENTERS_X) {
        for (z = [
            DIN_RAIL_CLIP_MOUNT_Z - 20,
            DIN_RAIL_CLIP_MOUNT_Z + 20
        ]) {
            translate([x, ENCLOSURE_D + 2, z])
                rotate([90, 0, 0])
                    cylinder(h = WALL + 6, d = 4.2);
        }
    }
}

module printable_chassis_core() {
    difference() {
        chassis_no_integrated_clip();
        rear_clip_mount_holes();
    }
}

module split_part_x(x0, width, z_min = -10, z_height = 160) {
    translate([-x0, 0, 0])
        intersection() {
            children();
            translate([x0 - CUT_OVERLAP, -20, z_min])
                cube([width + 2 * CUT_OVERLAP, ENCLOSURE_D + 40, z_height]);
        }
}

module seam_lip_left(length_y, height_z, y0 = WALL, z0 = FLOOR_T) {
    translate([SPLIT_X - 7, y0, z0])
        cube([7 + PRINT_CLEARANCE, length_y, height_z]);
}

module seam_lip_right_socket(length_y, height_z, y0 = WALL, z0 = FLOOR_T) {
    translate([SPLIT_X - 7 - PRINT_CLEARANCE, y0 - 0.1, z0 - 0.1])
        cube([7 + 2 * PRINT_CLEARANCE, length_y + 0.2, height_z + 0.2]);
}

module label_raised(label, pos, size_value = 5) {
    translate(pos)
        linear_extrude(height = 0.45)
            text(label, size = size_value, halign = "center", valign = "center");
}
// main file
// Screw-on dual rear DIN-rail carrier for the printable split chassis.
// The wide backing plate distributes the appliance load across two hooks.

include <printable-common.scad>

$fn = 48;

module screw_on_rear_din_clip() {
    difference() {
        union() {
            // Backing plate against the chassis rear wall.
            translate([-102.5, -2, -32])
                cube([205, 4, 64]);

            for (clip_x = [-70, 70]) {
                translate([clip_x, 0, 0])
                    rear_din_clip();
            }
        }

        for (x = [-70, 70]) {
            for (z = [-20, 20]) {
                translate([x, 4, z])
                    rotate([90, 0, 0])
                        cylinder(h = 10, d = 4.2);
            }
        }
    }
}

rotate([0, 0, 0])
    screw_on_rear_din_clip();
